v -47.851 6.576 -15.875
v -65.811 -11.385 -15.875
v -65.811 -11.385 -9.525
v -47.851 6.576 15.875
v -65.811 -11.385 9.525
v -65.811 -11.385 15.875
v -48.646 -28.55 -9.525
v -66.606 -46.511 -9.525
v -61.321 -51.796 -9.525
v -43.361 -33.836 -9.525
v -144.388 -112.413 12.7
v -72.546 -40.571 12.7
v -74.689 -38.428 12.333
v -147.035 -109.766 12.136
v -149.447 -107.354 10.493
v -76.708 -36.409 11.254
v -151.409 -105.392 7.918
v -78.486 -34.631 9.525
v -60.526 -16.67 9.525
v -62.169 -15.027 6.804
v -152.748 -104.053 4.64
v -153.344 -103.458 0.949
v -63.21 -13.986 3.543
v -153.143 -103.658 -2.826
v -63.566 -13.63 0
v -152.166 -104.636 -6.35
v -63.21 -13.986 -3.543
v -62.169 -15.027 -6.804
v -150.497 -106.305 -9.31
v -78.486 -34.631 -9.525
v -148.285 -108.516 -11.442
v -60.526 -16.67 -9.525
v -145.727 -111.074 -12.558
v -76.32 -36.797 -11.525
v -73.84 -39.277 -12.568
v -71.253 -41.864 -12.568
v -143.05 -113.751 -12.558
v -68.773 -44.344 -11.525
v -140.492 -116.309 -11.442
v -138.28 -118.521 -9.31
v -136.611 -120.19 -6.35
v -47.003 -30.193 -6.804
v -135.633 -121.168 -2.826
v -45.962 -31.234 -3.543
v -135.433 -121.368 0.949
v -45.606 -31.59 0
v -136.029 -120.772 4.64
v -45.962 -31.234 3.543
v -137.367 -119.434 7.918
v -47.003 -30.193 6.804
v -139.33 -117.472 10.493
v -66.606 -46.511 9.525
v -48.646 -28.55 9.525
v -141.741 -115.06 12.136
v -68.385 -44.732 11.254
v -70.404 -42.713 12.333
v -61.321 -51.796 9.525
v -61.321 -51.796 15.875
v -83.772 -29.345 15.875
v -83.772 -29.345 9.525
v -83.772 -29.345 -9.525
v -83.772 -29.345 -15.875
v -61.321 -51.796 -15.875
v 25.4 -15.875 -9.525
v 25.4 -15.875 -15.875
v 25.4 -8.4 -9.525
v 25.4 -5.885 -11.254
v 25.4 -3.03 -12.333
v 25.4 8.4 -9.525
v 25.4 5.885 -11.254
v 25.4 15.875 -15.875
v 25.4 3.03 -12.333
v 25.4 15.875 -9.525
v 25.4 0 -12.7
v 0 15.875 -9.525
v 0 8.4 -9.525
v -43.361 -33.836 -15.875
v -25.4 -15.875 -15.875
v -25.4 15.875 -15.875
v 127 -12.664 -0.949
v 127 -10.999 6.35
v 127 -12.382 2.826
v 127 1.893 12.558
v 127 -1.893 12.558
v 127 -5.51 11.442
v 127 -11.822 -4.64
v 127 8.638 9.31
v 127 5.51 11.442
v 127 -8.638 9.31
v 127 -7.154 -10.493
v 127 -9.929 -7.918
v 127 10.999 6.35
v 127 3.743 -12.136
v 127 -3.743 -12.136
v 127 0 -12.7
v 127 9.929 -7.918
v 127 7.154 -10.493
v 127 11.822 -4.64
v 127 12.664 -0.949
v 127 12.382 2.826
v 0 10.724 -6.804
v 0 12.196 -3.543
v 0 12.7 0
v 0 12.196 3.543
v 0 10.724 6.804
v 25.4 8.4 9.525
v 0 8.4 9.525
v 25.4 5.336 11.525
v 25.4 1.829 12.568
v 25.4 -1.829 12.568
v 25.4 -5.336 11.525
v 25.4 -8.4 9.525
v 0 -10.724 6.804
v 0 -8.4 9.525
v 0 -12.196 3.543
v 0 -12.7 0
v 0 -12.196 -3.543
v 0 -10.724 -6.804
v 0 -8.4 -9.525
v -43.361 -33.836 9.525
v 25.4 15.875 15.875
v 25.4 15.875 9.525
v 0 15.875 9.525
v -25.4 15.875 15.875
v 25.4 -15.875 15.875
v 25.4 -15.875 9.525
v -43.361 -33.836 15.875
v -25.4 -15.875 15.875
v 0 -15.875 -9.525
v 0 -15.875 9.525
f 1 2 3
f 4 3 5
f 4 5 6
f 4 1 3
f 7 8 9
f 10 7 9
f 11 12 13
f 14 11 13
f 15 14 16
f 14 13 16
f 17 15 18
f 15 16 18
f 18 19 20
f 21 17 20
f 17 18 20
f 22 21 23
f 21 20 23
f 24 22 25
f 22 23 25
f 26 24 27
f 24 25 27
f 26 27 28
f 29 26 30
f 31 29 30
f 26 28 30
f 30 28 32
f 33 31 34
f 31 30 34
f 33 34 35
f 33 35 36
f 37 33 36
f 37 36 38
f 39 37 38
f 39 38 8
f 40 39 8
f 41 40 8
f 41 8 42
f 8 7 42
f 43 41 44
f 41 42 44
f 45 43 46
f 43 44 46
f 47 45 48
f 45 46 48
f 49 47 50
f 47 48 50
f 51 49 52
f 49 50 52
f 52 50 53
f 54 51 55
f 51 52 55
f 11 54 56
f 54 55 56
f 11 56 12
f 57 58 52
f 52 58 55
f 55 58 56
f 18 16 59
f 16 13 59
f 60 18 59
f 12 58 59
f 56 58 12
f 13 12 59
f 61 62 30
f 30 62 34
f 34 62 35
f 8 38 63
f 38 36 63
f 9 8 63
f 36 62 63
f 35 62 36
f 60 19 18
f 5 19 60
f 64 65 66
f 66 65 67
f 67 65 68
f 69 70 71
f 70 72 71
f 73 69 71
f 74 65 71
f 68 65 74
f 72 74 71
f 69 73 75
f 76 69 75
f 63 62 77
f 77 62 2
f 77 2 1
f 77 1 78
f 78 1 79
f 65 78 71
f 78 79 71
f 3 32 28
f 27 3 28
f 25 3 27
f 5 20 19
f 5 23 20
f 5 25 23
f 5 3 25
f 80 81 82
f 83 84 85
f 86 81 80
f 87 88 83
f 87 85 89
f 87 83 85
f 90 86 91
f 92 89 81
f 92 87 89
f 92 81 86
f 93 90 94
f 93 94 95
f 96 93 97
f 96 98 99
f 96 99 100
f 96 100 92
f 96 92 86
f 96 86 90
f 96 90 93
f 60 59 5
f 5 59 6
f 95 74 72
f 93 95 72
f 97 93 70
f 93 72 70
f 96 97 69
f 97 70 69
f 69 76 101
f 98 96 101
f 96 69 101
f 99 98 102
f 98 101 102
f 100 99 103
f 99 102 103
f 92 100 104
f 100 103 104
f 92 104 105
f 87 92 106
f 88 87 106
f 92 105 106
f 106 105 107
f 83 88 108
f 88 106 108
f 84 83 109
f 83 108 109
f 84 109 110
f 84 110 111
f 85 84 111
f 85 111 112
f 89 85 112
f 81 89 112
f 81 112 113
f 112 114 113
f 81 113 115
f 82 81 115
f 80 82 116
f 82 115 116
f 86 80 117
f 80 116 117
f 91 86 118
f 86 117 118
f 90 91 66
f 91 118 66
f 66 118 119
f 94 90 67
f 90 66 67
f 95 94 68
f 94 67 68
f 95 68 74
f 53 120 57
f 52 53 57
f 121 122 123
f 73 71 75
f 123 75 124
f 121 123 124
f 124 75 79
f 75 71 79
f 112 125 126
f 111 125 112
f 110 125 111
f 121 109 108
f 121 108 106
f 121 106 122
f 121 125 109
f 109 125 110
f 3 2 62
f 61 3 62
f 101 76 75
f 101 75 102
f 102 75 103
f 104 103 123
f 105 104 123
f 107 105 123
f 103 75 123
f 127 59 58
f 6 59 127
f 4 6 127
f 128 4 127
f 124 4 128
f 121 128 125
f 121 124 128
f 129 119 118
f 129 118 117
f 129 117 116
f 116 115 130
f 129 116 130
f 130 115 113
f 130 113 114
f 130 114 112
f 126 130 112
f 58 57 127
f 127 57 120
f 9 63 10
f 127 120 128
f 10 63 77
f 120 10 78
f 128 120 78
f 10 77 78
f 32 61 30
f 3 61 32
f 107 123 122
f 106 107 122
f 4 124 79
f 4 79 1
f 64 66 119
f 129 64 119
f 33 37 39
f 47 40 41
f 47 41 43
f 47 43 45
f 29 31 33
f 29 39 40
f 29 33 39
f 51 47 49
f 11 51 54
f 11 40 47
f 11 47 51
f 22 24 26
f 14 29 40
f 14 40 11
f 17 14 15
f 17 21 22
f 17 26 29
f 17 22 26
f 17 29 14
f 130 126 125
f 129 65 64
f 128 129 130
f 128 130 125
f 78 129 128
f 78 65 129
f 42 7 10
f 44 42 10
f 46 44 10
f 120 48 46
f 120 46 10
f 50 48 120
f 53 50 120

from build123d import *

# Parameters (mm, degrees)
SKETCH1_R           = 12.7
BOSS_EXTRUDE1_DEPTH = 127
SKETCH2_W           = 31.75
SKETCH2_H           = 31.75
BOSS_EXTRUDE2_DEPTH = 25.4
SKETCH3_W           = 25.4
SKETCH3_H           = 31.75
BOSS_EXTRUDE3_DEPTH = 6.35
SKETCH4_W           = 25.4
SKETCH4_H           = 31.75
BOSS_EXTRUDE4_DEPTH = 6.35
SKETCH9_W           = 31.75
SKETCH9_H           = 31.75
BOSS_EXTRUDE5_DEPTH = 25.4
SKETCH11_R          = 12.7
BOSS_EXTRUDE6_DEPTH = 127
BOSS_EXTRUDE7_DEPTH = 6.35
BOSS_EXTRUDE8_DEPTH = 6.35
BOSS_EXTRUDE9_DEPTH = 31.75


with BuildPart() as part:
    # Sketch1 → Boss-Extrude1 (new body)
    with BuildSketch(Plane(origin=(0, 0, 0), x_dir=(0, 0, -1), z_dir=(1, 0, 0))):
        Circle(SKETCH1_R)
    extrude(amount=BOSS_EXTRUDE1_DEPTH)

    # Sketch2 → Boss-Extrude2 (add)
    with BuildSketch(Plane.ZY):
        Rectangle(SKETCH2_W, SKETCH2_H)
    extrude(amount=BOSS_EXTRUDE2_DEPTH)

    # Sketch3 → Boss-Extrude3 (add)
    with BuildSketch(Plane.XY.offset(15.875)):
        with Locations((12.7, 0)):
            Rectangle(SKETCH3_W, SKETCH3_H)
    extrude(amount=-BOSS_EXTRUDE3_DEPTH)

    # Sketch4 → Boss-Extrude4 (add)
    with BuildSketch(Plane(origin=(0, 0, -15.875), x_dir=(-1, 0, 0), z_dir=(0, 0, -1))):
        with Locations((-12.7, 0)):
            Rectangle(SKETCH4_W, SKETCH4_H)
    extrude(amount=-BOSS_EXTRUDE4_DEPTH)



with BuildPart() as body_2:
    # Sketch9 → Boss-Extrude5 (new body)
    with BuildSketch(Plane(origin=(-20.6375, -20.6375, 0), x_dir=(0, 0, 1), z_dir=(-0.707106781, -0.707106781, 0))):
        with Locations((0, 22.610192091)):
            Rectangle(SKETCH9_W, SKETCH9_H)
    extrude(amount=BOSS_EXTRUDE5_DEPTH)

    # Sketch11 → Boss-Extrude6 (add)
    with BuildSketch(Plane(origin=(-38.598012242, -38.598012242, 0), x_dir=(0, 0, 1), z_dir=(-0.707106781, -0.707106781, 0))):
        with Locations((0, 22.610192091)):
            Circle(SKETCH11_R)
    extrude(amount=BOSS_EXTRUDE6_DEPTH)

    # Sketch13 → Boss-Extrude7 (add)
    with BuildSketch(Plane.XY.offset(15.875)):
        Polygon((-43.360512242, -33.835512242), (-61.321024484, -51.796024484), (-83.771664787, -29.345384182), (-65.811152545, -11.384871939), align=None)
    extrude(amount=-BOSS_EXTRUDE7_DEPTH)

    # Sketch14 → Boss-Extrude8 (add)
    with BuildSketch(Plane(origin=(0, 0, -15.875), x_dir=(-1, 0, 0), z_dir=(0, 0, -1))):
        Polygon((65.811152545, -11.384871939), (83.771664787, -29.345384182), (61.321024484, -51.796024484), (43.360512242, -33.835512242), align=None)
    extrude(amount=-BOSS_EXTRUDE8_DEPTH)


with BuildPart() as part_1:
    add(part.part)

    add(body_2.part)  # Boss-Extrude9 merges body 2
    # Sketch15 → Boss-Extrude9 (add)
    with BuildSketch(Plane(origin=(0, 0, -15.875), x_dir=(-1, 0, 0), z_dir=(0, 0, -1))):
        Polygon((25.4, 15.875), (47.850640303, 6.575640303), (25.4, -15.875), align=None)
    extrude(amount=-BOSS_EXTRUDE9_DEPTH)


solid = part_1.part
